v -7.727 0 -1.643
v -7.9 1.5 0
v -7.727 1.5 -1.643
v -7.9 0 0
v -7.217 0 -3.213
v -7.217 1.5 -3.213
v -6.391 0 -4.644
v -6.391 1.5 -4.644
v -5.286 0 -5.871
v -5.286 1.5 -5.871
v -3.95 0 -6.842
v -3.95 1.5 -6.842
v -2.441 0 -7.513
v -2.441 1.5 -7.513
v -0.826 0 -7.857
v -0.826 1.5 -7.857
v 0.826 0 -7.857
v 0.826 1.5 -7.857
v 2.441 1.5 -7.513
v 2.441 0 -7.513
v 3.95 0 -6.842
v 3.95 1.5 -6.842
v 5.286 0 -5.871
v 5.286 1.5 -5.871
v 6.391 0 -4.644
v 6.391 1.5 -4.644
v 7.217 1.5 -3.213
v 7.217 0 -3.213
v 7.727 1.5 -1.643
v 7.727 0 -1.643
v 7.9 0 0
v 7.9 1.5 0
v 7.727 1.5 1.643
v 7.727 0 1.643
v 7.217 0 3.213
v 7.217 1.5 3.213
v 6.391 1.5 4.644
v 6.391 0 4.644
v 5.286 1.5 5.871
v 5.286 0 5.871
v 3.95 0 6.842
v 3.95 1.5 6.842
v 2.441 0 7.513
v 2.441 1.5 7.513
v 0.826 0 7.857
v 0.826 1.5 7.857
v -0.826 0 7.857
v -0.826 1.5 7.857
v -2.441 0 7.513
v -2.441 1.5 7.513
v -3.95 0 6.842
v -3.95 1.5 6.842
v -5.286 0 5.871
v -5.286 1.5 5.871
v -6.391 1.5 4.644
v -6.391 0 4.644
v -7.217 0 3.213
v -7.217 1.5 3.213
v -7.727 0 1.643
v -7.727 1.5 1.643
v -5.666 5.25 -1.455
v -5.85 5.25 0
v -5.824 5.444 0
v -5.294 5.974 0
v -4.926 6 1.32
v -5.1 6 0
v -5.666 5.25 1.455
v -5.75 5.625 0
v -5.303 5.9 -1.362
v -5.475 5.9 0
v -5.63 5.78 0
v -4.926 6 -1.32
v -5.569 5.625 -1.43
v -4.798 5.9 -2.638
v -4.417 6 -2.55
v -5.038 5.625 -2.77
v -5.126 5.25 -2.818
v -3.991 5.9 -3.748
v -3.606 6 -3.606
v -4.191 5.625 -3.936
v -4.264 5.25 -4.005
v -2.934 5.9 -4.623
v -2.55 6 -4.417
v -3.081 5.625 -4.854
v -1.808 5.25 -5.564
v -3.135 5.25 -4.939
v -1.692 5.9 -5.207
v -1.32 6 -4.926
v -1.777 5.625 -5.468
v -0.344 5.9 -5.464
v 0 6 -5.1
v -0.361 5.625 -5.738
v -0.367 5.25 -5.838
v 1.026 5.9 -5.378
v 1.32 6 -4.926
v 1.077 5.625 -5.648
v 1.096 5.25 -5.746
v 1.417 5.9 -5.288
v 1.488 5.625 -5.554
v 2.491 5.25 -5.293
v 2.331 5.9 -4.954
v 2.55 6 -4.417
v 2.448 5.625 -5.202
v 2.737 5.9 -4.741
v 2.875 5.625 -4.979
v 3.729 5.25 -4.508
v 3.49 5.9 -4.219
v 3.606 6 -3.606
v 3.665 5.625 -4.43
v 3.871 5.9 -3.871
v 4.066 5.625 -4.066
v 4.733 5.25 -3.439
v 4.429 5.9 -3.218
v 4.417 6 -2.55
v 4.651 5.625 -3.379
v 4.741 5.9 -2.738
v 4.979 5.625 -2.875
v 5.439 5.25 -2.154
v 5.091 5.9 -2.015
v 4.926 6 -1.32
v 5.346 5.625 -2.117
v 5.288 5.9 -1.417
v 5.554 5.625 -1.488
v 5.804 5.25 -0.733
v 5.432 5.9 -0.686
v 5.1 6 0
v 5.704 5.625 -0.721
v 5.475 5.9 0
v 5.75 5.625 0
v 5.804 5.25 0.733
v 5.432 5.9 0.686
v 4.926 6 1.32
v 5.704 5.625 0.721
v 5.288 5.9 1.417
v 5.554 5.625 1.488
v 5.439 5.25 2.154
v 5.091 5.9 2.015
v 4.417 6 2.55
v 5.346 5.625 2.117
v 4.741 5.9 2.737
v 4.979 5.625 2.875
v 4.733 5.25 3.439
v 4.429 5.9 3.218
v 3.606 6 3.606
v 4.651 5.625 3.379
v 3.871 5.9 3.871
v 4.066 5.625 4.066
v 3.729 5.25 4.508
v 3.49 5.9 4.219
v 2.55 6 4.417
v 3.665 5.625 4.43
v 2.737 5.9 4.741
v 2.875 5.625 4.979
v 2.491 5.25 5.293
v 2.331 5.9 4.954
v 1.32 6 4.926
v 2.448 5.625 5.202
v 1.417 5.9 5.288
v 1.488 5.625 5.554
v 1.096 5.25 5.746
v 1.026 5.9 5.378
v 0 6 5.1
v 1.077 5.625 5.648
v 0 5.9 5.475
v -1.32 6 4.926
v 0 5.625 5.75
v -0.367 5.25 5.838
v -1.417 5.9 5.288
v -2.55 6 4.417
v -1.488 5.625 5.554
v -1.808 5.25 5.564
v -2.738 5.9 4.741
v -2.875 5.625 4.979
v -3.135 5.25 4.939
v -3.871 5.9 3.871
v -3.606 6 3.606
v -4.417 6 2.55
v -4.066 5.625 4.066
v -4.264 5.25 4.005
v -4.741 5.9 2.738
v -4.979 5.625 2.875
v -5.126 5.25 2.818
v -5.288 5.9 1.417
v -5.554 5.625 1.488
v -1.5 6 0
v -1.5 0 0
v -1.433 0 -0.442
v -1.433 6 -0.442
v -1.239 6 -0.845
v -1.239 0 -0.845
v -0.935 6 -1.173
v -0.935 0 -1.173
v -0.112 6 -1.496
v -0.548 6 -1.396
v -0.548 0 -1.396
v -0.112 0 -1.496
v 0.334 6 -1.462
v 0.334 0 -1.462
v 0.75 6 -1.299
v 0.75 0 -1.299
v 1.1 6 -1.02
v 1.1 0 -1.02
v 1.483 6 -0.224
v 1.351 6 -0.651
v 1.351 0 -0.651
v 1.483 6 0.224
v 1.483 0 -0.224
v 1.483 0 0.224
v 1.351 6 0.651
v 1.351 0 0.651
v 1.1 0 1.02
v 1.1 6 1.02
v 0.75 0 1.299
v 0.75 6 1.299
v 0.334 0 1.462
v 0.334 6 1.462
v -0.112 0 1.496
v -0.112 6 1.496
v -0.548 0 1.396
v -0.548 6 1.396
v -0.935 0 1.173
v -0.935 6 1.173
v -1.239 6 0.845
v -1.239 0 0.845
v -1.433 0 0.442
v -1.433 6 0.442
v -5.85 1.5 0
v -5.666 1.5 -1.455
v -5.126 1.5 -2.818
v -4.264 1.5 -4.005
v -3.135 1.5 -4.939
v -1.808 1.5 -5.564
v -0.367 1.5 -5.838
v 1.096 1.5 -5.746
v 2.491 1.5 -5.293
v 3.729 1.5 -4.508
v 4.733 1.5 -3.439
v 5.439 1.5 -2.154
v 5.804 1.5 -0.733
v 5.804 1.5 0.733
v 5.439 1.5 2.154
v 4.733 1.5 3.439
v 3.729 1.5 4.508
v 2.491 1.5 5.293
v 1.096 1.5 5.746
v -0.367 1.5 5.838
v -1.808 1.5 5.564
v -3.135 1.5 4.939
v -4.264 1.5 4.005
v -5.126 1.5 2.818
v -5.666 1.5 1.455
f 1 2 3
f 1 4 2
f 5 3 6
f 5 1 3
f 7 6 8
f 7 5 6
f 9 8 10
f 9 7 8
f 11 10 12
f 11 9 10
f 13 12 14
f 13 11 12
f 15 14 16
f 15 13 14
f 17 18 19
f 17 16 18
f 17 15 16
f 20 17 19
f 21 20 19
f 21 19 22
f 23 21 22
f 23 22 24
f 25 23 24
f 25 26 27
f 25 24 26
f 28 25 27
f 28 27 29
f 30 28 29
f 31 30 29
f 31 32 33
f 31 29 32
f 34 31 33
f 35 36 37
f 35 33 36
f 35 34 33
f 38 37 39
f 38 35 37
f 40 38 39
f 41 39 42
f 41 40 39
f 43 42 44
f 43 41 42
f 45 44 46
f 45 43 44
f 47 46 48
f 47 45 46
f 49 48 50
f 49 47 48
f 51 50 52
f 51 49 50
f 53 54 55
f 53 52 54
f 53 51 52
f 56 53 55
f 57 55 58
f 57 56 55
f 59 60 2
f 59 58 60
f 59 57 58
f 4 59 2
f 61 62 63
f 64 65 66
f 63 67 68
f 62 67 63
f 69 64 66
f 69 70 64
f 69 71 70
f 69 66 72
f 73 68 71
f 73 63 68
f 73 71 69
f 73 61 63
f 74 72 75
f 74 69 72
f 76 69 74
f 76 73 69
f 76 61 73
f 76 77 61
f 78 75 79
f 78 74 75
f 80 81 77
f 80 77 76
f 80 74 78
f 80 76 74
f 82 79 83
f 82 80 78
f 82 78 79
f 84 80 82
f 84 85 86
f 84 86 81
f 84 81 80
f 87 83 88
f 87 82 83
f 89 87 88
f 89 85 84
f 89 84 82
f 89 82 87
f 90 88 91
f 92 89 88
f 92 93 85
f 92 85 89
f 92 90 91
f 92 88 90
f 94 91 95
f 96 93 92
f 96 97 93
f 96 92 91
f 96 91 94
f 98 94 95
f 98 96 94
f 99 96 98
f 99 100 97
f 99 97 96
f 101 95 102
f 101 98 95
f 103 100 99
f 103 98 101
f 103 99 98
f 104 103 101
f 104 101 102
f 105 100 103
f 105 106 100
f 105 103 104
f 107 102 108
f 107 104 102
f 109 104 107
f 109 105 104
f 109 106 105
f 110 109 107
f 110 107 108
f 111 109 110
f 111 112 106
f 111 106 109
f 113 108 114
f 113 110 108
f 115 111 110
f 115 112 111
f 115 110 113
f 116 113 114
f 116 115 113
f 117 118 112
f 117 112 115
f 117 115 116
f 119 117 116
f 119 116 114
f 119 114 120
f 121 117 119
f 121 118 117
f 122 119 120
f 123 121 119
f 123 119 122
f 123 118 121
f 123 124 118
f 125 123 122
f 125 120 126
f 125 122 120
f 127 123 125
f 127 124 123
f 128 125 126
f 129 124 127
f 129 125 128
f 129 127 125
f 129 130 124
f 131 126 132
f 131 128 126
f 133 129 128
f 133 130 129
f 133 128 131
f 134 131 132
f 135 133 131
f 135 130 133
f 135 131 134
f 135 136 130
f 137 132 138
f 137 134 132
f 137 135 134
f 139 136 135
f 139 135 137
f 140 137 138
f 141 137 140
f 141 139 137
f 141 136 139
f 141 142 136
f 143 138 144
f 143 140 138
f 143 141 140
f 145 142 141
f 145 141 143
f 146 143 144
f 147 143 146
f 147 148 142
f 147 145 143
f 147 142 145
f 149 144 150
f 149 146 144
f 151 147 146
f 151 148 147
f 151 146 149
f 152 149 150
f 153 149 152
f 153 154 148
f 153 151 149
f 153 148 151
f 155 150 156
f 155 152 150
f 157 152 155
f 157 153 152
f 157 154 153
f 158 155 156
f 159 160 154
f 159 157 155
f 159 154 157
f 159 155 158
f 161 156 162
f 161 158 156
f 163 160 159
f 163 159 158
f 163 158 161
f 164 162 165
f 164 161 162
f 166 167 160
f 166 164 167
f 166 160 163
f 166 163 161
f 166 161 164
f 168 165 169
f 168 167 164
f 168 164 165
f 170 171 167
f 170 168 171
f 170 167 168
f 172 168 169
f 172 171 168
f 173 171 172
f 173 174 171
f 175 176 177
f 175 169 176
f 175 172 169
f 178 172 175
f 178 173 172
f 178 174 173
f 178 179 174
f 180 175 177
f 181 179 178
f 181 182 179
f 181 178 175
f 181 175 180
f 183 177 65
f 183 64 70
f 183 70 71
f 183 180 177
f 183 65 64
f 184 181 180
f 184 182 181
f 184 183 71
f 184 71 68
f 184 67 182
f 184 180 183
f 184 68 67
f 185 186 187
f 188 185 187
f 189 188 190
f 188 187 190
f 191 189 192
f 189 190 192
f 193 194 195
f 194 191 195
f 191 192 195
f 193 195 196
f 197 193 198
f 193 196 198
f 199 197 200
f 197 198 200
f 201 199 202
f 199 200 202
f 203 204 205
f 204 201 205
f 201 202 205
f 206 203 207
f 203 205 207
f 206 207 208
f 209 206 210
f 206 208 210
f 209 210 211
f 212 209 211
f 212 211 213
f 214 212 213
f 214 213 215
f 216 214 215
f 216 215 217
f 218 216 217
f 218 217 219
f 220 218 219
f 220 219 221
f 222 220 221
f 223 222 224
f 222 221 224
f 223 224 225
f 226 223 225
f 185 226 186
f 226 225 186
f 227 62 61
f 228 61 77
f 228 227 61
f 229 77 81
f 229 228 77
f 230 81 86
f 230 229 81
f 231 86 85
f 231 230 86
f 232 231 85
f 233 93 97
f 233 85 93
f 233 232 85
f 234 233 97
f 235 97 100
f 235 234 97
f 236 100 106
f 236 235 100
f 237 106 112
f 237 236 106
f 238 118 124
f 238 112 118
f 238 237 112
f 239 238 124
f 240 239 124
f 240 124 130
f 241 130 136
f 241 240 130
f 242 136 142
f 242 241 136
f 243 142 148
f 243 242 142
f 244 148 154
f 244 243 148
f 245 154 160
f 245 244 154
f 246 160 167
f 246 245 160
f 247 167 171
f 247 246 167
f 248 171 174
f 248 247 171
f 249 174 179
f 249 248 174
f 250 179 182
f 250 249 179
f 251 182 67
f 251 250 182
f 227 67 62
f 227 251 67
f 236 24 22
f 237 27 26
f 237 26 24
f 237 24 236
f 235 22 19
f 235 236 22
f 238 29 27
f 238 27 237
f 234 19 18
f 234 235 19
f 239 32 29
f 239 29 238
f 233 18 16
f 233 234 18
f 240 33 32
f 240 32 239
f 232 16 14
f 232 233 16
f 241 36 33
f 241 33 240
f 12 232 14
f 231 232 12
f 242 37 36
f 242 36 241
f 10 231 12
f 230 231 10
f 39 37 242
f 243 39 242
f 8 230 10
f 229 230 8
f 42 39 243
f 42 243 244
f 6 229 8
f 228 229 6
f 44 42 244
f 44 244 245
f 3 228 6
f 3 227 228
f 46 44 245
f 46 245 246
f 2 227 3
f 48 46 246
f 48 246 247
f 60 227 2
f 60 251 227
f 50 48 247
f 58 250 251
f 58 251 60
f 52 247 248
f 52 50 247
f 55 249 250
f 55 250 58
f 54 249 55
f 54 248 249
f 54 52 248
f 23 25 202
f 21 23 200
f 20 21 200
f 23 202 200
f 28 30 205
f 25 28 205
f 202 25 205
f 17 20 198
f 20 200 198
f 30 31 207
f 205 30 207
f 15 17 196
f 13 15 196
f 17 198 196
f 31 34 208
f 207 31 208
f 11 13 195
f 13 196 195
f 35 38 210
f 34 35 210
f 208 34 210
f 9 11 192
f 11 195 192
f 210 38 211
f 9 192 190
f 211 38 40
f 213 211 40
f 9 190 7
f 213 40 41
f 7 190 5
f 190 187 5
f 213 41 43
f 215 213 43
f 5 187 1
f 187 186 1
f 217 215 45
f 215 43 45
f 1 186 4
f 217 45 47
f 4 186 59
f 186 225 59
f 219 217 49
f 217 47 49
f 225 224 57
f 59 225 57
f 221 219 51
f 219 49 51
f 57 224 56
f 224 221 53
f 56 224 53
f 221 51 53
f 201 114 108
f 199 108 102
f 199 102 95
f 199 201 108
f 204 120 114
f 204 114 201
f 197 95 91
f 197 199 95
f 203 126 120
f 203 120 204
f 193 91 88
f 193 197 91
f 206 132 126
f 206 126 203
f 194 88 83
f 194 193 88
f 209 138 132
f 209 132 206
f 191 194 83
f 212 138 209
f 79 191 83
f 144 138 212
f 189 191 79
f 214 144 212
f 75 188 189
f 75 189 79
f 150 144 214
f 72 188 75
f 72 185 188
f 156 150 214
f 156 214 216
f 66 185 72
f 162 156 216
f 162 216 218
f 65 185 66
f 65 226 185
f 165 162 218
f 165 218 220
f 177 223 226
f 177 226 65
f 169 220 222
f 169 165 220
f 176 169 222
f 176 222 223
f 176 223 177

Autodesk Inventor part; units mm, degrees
ref_plane "YZ Plane" through (0, 0, 0) normal (1, 0, 0) x (0, 1, 0)
ref_plane "XZ Plane" through (0, 0, 0) normal (0, 1, 0) x (-1, 0, 0)
ref_plane "XY Plane" through (0, 0, 0) normal (0, 0, 1) x (1, 0, 0)
sketch "Sketch1" plane through (0, 0, 0) normal (0, 1, 0) x (-1, 0, 0)
  circle A0 centre (0, 0) radius 7.9
  circle A1 centre (0, 0) radius 5.85
  circle A2 centre (0, 0) radius 1.5
  dimension "d0" = 15.8
  dimension "d1" = 11.7
  dimension "d3" = 3
extrude "Extrusion1" add sketch "Sketch1" along normal blind 1.5 contours A0 | A1
extrude "Extrusion2" add sketch "Sketch1" along normal blind 6 contours A1
fillet "Fillet1" radius 0.75 1 edges at (5.85, 6, 0)
properties part number "juki-nozzle-base"
